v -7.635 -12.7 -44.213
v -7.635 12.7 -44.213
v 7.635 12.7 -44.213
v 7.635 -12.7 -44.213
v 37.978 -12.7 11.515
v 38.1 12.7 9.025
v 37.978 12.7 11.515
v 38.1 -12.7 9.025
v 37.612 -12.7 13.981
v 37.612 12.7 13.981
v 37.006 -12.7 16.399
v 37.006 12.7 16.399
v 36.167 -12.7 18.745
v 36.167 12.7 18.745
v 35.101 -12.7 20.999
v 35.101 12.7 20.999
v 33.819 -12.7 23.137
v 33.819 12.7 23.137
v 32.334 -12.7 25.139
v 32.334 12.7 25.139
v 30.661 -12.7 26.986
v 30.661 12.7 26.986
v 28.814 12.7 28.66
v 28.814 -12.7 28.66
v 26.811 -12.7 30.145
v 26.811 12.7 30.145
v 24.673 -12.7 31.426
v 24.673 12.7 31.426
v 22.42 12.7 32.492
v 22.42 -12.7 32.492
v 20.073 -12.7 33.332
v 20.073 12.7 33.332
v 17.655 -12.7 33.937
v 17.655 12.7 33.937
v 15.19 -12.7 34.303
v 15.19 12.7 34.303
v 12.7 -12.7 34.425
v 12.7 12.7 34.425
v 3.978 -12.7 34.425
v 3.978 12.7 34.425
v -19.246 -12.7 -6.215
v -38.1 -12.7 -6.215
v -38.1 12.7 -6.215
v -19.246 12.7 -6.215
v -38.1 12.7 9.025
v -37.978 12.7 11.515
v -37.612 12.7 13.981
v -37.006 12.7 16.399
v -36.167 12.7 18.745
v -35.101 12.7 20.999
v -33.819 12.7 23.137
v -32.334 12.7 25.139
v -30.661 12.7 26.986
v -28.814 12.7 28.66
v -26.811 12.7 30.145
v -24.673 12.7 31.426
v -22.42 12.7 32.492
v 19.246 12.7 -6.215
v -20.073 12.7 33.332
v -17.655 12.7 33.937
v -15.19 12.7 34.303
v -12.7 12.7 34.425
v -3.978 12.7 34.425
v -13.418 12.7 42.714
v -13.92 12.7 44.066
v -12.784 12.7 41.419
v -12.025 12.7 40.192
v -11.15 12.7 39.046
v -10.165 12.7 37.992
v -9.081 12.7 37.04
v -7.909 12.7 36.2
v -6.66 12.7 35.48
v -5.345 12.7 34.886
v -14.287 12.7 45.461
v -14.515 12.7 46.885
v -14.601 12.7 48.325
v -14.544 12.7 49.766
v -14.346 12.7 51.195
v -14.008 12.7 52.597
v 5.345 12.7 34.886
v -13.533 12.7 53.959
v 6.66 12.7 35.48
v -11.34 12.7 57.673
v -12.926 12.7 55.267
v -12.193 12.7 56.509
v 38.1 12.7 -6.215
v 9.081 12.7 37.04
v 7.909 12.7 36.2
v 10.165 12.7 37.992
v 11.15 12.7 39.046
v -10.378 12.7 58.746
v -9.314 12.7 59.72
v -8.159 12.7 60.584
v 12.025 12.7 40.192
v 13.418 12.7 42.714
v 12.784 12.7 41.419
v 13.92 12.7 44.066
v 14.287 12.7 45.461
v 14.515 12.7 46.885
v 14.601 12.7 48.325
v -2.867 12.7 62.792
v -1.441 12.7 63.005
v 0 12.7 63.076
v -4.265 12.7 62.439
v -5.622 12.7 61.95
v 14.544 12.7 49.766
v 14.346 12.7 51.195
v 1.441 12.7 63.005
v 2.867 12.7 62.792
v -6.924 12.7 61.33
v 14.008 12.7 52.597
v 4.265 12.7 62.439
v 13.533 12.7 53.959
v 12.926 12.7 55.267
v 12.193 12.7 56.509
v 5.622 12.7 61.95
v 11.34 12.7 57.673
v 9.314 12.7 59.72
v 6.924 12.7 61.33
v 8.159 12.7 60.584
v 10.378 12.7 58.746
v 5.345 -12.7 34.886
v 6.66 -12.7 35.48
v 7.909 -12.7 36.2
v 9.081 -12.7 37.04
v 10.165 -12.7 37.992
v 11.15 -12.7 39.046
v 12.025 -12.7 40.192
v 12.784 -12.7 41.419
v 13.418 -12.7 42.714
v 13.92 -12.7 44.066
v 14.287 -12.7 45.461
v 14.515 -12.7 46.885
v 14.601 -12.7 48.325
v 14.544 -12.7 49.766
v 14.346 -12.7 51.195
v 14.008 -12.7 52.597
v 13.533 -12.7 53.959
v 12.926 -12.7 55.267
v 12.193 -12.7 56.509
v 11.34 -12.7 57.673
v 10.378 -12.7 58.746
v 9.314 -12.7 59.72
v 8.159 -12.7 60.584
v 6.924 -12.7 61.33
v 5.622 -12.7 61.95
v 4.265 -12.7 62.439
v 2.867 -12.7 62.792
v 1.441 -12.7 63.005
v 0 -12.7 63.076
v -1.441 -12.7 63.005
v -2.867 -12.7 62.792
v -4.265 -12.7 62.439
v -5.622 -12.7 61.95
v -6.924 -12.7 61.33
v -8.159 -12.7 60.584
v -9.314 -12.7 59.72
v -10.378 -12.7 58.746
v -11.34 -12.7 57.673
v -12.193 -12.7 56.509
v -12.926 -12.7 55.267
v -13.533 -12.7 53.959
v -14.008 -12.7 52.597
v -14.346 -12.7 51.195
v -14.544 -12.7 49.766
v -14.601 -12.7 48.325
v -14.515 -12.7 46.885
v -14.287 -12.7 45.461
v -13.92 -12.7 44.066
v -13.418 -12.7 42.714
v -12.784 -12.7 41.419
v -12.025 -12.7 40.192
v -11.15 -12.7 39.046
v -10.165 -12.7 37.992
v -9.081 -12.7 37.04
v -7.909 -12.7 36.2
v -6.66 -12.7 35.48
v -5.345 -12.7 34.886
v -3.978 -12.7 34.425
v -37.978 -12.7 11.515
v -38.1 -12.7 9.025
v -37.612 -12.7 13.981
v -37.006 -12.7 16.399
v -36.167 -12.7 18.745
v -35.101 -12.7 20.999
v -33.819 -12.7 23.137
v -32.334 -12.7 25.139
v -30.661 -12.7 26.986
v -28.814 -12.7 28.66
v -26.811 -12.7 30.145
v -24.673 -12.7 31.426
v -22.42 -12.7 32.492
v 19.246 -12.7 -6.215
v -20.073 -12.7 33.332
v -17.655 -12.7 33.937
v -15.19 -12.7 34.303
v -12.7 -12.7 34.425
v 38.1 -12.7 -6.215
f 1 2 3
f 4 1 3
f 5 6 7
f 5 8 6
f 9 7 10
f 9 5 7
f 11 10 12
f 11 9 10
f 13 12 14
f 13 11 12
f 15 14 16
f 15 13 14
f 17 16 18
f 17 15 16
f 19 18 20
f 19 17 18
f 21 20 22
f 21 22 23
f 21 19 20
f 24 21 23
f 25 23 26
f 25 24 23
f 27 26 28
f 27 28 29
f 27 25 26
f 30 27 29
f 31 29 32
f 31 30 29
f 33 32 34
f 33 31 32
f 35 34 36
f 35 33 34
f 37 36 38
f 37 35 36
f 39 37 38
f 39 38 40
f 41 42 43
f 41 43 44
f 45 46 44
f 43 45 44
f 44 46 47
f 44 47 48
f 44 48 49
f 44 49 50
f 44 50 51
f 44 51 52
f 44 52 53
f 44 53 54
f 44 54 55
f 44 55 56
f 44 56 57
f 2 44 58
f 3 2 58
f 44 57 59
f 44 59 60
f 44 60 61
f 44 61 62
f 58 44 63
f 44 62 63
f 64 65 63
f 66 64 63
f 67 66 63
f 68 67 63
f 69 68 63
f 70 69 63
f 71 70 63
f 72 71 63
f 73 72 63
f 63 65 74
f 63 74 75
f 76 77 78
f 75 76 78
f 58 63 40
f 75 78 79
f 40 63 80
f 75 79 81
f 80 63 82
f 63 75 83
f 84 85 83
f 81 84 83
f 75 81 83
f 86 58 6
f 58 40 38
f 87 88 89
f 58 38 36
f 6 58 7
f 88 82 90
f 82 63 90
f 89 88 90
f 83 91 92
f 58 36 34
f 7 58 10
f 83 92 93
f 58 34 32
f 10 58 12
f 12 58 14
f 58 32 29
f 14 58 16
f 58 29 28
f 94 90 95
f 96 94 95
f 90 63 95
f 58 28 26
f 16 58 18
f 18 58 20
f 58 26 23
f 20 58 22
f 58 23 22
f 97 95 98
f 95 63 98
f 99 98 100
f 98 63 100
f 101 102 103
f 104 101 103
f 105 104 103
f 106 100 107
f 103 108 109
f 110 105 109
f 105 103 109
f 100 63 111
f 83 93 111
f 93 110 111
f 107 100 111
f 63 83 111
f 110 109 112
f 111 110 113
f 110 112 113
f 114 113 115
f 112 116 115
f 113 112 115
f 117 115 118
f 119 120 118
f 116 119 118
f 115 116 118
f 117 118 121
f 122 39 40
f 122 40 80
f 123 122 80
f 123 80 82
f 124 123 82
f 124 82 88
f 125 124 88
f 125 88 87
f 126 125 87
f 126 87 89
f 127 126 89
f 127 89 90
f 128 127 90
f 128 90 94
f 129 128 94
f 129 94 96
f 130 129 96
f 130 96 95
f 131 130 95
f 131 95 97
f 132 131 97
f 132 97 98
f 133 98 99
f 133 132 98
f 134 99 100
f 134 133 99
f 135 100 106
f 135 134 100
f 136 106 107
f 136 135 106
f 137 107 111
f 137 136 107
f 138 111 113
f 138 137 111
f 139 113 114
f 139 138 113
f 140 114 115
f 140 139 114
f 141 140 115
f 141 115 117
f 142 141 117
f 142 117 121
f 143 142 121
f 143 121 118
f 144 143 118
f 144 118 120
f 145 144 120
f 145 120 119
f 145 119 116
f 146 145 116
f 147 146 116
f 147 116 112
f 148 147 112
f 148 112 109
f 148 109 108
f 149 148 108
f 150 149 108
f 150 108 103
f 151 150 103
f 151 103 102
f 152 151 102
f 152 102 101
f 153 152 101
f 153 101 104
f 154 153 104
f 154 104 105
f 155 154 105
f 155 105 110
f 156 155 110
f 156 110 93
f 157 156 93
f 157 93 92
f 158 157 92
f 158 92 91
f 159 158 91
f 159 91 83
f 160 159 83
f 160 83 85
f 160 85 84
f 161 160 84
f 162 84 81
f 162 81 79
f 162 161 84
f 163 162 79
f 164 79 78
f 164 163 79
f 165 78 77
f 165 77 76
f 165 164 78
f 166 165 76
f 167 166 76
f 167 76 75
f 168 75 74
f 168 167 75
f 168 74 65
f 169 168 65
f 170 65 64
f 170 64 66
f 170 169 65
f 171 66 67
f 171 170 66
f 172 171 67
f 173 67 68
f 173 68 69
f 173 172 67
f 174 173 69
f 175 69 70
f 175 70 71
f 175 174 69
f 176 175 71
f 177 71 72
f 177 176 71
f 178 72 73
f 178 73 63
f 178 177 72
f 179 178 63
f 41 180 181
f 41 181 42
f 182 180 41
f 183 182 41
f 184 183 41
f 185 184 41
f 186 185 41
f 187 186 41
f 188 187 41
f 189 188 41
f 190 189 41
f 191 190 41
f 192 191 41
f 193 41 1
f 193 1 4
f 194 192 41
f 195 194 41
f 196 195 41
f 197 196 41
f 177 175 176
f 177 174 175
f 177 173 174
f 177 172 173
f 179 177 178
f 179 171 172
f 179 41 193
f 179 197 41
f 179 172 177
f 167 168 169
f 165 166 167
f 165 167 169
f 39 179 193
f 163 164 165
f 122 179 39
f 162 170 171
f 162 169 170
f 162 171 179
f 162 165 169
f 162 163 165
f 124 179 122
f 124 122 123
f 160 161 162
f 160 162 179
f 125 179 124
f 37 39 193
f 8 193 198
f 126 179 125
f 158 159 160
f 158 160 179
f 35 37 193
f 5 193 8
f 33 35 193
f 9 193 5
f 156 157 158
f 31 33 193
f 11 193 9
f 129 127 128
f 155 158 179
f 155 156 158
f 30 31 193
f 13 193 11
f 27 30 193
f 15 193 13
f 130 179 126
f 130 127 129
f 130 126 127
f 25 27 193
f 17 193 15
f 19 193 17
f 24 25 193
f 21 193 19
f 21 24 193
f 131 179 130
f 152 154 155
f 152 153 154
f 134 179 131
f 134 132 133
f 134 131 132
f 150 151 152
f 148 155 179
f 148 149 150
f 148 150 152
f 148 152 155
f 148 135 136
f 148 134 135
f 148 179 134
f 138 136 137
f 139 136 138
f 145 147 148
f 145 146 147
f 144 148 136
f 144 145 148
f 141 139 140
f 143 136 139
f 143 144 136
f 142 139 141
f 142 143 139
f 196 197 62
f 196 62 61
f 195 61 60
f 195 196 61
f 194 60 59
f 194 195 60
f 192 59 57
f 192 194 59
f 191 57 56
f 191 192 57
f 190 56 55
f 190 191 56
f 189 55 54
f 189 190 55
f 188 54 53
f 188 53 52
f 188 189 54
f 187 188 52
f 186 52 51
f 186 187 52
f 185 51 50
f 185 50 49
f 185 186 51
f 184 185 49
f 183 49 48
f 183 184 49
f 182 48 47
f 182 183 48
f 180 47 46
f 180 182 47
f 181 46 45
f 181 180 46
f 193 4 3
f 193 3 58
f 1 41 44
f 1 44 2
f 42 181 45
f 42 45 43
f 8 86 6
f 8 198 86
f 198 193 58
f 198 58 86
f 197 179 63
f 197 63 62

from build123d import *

# Parameters (mm, degrees)
F2_DEPTH      = 12.7
F2_DEPTH_BACK = 12.7
F1_R          = 14.6016547105
F3_DEPTH      = 12.7
F3_DEPTH_BACK = 12.7


with BuildPart() as f2:
    # F0 (on Front) → F2 (new body, two sides)
    with BuildSketch(Plane.XZ) as f2_sk:
        with BuildLine():
            Line((12.7, 34.4253193842), (0, 34.4253193842))
            Line((0, 34.4253193842), (0, -5.8595561422))
            Line((0, -5.8595561422), (0, -6.2146806158))
            Line((0, -6.2146806158), (19.245794032, -6.2146806158))
            Line((19.245794032, -6.2146806158), (38.1, -6.2146806158))
            Line((38.1, -6.2146806158), (38.1, 9.0253193842))
            ThreePointArc((38.1, 9.0253193842), (30.6605122421, 26.9858316263), (12.7, 34.4253193842))
        make_face()
        with BuildLine():
            Line((0, -5.8595561422), (0, 34.4253193842))
            Line((0, 34.4253193842), (-12.7, 34.4253193842))
            ThreePointArc((-12.7, 34.4253193842), (-30.6605122421, 26.9858316263), (-38.1, 9.0253193842))
            Line((-38.1, 9.0253193842), (-38.1, -6.2146806158))
            Line((-38.1, -6.2146806158), (-19.245794032, -6.2146806158))
            Line((-19.245794032, -6.2146806158), (0, -5.8595561422))
        make_face()
        Polygon((0, -6.2146806158), (0, -5.8595561422), (-19.245794032, -6.2146806158), align=None)
        Polygon((19.245794032, -6.2146806158), (0, -6.2146806158), (-19.245794032, -6.2146806158), (-7.6351859607, -44.2130304873), (7.6351859607, -44.2130304873), align=None)
    extrude(amount=F2_DEPTH)
    extrude(f2_sk.sketch, amount=-F2_DEPTH_BACK)

    # F1 (on Front) → F3 (join, two sides)
    with BuildSketch(Plane.XZ) as f3_sk:
        with Locations((0, 48.4745278955)):
            Circle(F1_R)
    extrude(amount=F3_DEPTH)
    extrude(f3_sk.sketch, amount=-F3_DEPTH_BACK)


solid = f2.part
